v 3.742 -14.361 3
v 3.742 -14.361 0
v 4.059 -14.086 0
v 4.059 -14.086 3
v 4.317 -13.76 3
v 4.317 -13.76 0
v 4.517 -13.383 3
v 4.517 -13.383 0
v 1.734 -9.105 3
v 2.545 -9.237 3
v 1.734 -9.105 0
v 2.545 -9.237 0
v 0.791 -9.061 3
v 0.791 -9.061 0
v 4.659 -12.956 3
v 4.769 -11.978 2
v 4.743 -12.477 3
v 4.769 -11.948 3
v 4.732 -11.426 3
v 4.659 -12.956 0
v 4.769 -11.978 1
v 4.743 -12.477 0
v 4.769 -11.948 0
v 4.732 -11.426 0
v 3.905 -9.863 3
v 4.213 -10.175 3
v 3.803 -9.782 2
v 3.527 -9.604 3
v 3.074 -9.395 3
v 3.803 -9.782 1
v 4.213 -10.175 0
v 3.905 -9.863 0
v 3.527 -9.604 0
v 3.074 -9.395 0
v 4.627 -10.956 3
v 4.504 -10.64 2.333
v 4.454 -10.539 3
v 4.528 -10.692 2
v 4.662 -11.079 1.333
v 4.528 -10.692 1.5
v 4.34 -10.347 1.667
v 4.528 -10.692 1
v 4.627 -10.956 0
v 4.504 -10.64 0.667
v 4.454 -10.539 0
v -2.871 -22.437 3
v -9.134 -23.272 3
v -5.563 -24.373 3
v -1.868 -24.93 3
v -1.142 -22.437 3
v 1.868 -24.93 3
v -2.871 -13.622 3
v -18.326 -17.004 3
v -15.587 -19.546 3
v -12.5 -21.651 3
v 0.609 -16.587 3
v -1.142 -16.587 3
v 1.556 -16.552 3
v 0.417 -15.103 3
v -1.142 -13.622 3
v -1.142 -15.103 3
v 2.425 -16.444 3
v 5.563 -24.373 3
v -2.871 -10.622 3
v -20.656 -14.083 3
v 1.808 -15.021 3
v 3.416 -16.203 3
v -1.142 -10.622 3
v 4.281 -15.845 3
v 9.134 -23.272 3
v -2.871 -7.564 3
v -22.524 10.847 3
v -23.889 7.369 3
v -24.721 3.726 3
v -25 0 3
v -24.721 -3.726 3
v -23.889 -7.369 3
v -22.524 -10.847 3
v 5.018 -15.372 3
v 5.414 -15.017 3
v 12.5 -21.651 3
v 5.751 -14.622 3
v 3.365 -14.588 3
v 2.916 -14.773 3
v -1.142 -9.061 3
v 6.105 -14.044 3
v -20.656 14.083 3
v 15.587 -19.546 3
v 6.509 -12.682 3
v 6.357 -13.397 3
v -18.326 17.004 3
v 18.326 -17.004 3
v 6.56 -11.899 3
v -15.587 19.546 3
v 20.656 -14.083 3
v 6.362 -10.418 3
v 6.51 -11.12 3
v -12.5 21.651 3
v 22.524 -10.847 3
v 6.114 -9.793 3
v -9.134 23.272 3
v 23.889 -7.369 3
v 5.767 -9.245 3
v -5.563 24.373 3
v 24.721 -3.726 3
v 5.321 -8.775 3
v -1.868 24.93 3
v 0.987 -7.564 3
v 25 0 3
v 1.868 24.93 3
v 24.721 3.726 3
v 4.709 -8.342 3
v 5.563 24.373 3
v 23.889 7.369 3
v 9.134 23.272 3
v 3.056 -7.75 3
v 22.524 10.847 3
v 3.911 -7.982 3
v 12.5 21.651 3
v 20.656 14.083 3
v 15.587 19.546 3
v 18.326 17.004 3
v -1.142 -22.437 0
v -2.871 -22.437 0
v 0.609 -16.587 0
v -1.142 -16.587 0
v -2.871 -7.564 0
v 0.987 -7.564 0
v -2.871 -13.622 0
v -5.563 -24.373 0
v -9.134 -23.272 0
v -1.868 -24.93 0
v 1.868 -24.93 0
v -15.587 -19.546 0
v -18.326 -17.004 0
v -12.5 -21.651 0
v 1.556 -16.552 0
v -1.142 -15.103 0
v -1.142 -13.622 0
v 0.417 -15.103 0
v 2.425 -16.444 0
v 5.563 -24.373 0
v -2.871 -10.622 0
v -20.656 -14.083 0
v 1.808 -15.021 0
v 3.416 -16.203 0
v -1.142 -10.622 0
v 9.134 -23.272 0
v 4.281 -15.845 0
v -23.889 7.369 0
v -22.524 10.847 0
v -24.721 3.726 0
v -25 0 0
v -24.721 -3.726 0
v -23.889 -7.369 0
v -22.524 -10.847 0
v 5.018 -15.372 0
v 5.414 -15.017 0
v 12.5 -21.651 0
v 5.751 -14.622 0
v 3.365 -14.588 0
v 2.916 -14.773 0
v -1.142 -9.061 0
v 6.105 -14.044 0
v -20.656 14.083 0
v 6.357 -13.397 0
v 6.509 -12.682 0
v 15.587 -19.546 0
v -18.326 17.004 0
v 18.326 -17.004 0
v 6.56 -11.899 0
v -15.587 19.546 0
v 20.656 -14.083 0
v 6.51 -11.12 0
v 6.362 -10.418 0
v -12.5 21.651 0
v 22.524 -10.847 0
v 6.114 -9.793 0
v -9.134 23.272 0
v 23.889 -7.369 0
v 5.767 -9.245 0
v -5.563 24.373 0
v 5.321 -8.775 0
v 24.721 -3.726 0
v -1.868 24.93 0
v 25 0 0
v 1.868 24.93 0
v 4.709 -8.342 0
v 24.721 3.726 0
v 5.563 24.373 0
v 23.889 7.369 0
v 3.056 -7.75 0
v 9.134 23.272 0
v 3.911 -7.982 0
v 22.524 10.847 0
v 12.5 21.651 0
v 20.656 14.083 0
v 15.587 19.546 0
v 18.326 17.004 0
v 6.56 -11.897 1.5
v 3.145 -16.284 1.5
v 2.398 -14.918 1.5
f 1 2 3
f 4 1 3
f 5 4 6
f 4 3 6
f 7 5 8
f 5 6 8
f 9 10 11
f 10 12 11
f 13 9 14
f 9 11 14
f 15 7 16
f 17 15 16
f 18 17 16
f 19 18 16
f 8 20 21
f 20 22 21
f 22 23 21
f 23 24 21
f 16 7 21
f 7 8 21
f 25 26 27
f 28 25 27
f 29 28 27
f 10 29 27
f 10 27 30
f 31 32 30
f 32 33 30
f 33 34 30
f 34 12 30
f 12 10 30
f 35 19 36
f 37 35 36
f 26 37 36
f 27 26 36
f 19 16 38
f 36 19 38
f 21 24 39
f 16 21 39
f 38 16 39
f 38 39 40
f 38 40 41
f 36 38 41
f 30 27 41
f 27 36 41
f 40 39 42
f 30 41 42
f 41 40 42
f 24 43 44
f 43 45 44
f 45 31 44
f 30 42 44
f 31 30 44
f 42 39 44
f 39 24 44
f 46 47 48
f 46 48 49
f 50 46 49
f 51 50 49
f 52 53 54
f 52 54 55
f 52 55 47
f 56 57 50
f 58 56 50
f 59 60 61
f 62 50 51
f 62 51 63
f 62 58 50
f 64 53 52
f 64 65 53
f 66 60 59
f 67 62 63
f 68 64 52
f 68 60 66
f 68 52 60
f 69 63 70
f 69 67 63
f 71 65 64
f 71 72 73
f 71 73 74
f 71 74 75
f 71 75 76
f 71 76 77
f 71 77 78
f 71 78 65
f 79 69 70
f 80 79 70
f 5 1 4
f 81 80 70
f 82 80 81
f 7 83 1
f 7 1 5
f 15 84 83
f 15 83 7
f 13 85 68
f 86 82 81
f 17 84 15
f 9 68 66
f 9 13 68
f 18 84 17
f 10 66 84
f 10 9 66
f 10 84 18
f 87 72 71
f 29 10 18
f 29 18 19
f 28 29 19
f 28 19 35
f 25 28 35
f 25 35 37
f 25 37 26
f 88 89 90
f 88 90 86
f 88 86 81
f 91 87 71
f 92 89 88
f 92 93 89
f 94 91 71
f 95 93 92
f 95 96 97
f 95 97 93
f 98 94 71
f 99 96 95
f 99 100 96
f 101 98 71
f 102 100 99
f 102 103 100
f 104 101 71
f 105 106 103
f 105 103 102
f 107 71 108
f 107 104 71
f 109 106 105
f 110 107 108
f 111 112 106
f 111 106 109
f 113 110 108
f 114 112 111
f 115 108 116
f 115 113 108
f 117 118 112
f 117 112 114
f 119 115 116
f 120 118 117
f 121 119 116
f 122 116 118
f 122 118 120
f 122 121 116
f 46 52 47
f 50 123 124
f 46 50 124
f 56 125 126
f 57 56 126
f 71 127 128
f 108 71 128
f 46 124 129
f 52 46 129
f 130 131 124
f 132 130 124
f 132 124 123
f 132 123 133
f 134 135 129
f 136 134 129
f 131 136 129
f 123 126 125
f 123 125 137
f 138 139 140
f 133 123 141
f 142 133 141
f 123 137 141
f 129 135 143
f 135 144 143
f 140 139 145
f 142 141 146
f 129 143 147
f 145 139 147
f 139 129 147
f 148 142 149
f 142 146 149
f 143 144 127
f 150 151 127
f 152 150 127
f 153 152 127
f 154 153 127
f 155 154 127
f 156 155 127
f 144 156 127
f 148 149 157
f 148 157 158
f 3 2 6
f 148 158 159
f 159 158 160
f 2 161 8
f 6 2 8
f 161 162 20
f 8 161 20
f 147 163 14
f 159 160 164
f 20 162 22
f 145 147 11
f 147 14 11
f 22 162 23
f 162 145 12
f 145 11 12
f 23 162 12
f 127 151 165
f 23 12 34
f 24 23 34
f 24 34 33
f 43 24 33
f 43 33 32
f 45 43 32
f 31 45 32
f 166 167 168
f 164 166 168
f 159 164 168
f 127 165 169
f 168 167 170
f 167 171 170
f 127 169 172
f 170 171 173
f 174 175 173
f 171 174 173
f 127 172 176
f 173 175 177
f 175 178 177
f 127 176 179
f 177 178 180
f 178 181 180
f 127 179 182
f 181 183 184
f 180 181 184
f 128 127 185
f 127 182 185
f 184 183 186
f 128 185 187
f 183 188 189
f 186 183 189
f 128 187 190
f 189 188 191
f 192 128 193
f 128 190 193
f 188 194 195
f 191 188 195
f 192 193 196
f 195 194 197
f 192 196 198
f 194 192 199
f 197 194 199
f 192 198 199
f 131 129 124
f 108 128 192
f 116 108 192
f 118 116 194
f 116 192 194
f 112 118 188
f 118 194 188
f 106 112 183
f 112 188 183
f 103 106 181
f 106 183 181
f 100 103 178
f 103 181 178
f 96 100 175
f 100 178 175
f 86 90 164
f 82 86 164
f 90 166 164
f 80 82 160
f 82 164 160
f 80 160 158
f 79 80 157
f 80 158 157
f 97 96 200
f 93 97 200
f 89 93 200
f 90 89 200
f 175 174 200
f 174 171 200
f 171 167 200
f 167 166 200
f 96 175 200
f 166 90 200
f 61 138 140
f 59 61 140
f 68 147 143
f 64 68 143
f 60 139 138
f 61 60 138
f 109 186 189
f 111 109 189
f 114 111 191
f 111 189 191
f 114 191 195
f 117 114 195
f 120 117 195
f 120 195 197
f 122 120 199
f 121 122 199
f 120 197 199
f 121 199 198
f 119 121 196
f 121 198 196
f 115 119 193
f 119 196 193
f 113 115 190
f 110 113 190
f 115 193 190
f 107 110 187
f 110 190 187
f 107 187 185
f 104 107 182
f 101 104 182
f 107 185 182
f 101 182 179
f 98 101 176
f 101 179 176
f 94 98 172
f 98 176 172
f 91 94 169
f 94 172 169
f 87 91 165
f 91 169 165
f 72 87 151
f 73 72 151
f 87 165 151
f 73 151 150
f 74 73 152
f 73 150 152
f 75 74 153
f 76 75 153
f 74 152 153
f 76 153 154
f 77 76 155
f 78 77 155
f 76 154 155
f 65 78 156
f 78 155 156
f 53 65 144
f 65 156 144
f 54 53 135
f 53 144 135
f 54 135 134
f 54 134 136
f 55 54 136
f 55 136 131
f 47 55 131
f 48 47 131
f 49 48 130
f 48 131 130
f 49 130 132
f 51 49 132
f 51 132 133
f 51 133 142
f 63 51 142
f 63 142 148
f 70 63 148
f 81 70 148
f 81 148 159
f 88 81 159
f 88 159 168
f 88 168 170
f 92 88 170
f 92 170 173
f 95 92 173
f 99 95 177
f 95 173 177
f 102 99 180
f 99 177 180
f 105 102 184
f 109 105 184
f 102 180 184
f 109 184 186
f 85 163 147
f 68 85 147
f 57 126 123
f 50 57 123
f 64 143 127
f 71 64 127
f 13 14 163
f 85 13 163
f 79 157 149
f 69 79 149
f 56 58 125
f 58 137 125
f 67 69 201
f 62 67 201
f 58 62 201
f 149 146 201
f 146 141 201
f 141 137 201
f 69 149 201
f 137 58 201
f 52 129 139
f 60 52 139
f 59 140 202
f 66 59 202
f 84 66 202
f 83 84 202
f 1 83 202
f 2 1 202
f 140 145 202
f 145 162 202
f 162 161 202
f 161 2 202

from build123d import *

# Parameters (mm, degrees)
F0_R     = 25
F1_DEPTH = 3
F3_DEPTH = 3


with BuildPart() as f1:
    # F0 (on Top) → F1 (new body)
    with BuildSketch(Plane.XY):
        Circle(F0_R)
        with BuildLine():
            add(Edge.make_bspline(
                [(0.9868079036, -7.5640504993), (6.5597245703, -7.5640504993), (6.5597245703, -11.896732791)],
                knots=[0, 0, 0, 1, 1, 1], degree=2))
            add(Edge.make_bspline(
                [(6.5597245703, -11.896732791), (6.5597245703, -14.1558473743), (5.0183834244, -15.3716676868)],
                knots=[0, 0, 0, 1, 1, 1], degree=2))
            add(Edge.make_bspline(
                [(5.0183834244, -15.3716676868), (3.4770422786, -16.5874879993), (0.6092037369, -16.5874879993)],
                knots=[0, 0, 0, 1, 1, 1], degree=2))
            Line((0.6092037369, -16.5874879993), (-1.1420983464, -16.5874879993))
            Line((-1.1420983464, -16.5874879993), (-1.1420983464, -22.4370973743))
            Line((-1.1420983464, -22.4370973743), (-2.8706139714, -22.4370973743))
            Line((-2.8706139714, -22.4370973743), (-2.8706139714, -7.5640504993))
            Line((-2.8706139714, -7.5640504993), (0.9868079036, -7.5640504993))
        make_face(mode=Mode.SUBTRACT)
    extrude(amount=F1_DEPTH)



with BuildPart() as f1b:
    # F0 (on Top) → F1, piece 2 (new body)
    with BuildSketch(Plane.XY):
        with BuildLine():
            Line((-1.1420983464, -9.0614463327), (-1.1420983464, -15.1031129993))
            Line((-1.1420983464, -15.1031129993), (0.4171464453, -15.1031129993))
            add(Edge.make_bspline(
                [(0.4171464453, -15.1031129993), (2.7153235286, -15.1031129993), (3.7423417578, -14.3609254993)],
                knots=[0, 0, 0, 1, 1, 1], degree=2))
            add(Edge.make_bspline(
                [(3.7423417578, -14.3609254993), (4.7693599869, -13.6187379993), (4.7693599869, -11.9781129993)],
                knots=[0, 0, 0, 1, 1, 1], degree=2))
            add(Edge.make_bspline(
                [(4.7693599869, -11.9781129993), (4.7693599869, -10.5035036243), (3.8025631119, -9.7824749785)],
                knots=[0, 0, 0, 1, 1, 1], degree=2))
            add(Edge.make_bspline(
                [(3.8025631119, -9.7824749785), (2.8357662369, -9.0614463327), (0.7914954036, -9.0614463327)],
                knots=[0, 0, 0, 1, 1, 1], degree=2))
            Line((0.7914954036, -9.0614463327), (-1.1420983464, -9.0614463327))
        make_face()
    extrude(amount=F1_DEPTH)


with BuildPart() as f1_1:
    add(f1.part)

    add(f1b.part)  # F3 merges F1b
    # F2 (on Top) → F3 (join)
    with BuildSketch(Plane.XY):
        Polygon((0, -10.621725142), (-9.7534448872, -10.621725142), (-9.6736760242, -13.621725142), (0, -13.621725142), align=None)
    extrude(amount=F3_DEPTH)


solid = f1_1.part
